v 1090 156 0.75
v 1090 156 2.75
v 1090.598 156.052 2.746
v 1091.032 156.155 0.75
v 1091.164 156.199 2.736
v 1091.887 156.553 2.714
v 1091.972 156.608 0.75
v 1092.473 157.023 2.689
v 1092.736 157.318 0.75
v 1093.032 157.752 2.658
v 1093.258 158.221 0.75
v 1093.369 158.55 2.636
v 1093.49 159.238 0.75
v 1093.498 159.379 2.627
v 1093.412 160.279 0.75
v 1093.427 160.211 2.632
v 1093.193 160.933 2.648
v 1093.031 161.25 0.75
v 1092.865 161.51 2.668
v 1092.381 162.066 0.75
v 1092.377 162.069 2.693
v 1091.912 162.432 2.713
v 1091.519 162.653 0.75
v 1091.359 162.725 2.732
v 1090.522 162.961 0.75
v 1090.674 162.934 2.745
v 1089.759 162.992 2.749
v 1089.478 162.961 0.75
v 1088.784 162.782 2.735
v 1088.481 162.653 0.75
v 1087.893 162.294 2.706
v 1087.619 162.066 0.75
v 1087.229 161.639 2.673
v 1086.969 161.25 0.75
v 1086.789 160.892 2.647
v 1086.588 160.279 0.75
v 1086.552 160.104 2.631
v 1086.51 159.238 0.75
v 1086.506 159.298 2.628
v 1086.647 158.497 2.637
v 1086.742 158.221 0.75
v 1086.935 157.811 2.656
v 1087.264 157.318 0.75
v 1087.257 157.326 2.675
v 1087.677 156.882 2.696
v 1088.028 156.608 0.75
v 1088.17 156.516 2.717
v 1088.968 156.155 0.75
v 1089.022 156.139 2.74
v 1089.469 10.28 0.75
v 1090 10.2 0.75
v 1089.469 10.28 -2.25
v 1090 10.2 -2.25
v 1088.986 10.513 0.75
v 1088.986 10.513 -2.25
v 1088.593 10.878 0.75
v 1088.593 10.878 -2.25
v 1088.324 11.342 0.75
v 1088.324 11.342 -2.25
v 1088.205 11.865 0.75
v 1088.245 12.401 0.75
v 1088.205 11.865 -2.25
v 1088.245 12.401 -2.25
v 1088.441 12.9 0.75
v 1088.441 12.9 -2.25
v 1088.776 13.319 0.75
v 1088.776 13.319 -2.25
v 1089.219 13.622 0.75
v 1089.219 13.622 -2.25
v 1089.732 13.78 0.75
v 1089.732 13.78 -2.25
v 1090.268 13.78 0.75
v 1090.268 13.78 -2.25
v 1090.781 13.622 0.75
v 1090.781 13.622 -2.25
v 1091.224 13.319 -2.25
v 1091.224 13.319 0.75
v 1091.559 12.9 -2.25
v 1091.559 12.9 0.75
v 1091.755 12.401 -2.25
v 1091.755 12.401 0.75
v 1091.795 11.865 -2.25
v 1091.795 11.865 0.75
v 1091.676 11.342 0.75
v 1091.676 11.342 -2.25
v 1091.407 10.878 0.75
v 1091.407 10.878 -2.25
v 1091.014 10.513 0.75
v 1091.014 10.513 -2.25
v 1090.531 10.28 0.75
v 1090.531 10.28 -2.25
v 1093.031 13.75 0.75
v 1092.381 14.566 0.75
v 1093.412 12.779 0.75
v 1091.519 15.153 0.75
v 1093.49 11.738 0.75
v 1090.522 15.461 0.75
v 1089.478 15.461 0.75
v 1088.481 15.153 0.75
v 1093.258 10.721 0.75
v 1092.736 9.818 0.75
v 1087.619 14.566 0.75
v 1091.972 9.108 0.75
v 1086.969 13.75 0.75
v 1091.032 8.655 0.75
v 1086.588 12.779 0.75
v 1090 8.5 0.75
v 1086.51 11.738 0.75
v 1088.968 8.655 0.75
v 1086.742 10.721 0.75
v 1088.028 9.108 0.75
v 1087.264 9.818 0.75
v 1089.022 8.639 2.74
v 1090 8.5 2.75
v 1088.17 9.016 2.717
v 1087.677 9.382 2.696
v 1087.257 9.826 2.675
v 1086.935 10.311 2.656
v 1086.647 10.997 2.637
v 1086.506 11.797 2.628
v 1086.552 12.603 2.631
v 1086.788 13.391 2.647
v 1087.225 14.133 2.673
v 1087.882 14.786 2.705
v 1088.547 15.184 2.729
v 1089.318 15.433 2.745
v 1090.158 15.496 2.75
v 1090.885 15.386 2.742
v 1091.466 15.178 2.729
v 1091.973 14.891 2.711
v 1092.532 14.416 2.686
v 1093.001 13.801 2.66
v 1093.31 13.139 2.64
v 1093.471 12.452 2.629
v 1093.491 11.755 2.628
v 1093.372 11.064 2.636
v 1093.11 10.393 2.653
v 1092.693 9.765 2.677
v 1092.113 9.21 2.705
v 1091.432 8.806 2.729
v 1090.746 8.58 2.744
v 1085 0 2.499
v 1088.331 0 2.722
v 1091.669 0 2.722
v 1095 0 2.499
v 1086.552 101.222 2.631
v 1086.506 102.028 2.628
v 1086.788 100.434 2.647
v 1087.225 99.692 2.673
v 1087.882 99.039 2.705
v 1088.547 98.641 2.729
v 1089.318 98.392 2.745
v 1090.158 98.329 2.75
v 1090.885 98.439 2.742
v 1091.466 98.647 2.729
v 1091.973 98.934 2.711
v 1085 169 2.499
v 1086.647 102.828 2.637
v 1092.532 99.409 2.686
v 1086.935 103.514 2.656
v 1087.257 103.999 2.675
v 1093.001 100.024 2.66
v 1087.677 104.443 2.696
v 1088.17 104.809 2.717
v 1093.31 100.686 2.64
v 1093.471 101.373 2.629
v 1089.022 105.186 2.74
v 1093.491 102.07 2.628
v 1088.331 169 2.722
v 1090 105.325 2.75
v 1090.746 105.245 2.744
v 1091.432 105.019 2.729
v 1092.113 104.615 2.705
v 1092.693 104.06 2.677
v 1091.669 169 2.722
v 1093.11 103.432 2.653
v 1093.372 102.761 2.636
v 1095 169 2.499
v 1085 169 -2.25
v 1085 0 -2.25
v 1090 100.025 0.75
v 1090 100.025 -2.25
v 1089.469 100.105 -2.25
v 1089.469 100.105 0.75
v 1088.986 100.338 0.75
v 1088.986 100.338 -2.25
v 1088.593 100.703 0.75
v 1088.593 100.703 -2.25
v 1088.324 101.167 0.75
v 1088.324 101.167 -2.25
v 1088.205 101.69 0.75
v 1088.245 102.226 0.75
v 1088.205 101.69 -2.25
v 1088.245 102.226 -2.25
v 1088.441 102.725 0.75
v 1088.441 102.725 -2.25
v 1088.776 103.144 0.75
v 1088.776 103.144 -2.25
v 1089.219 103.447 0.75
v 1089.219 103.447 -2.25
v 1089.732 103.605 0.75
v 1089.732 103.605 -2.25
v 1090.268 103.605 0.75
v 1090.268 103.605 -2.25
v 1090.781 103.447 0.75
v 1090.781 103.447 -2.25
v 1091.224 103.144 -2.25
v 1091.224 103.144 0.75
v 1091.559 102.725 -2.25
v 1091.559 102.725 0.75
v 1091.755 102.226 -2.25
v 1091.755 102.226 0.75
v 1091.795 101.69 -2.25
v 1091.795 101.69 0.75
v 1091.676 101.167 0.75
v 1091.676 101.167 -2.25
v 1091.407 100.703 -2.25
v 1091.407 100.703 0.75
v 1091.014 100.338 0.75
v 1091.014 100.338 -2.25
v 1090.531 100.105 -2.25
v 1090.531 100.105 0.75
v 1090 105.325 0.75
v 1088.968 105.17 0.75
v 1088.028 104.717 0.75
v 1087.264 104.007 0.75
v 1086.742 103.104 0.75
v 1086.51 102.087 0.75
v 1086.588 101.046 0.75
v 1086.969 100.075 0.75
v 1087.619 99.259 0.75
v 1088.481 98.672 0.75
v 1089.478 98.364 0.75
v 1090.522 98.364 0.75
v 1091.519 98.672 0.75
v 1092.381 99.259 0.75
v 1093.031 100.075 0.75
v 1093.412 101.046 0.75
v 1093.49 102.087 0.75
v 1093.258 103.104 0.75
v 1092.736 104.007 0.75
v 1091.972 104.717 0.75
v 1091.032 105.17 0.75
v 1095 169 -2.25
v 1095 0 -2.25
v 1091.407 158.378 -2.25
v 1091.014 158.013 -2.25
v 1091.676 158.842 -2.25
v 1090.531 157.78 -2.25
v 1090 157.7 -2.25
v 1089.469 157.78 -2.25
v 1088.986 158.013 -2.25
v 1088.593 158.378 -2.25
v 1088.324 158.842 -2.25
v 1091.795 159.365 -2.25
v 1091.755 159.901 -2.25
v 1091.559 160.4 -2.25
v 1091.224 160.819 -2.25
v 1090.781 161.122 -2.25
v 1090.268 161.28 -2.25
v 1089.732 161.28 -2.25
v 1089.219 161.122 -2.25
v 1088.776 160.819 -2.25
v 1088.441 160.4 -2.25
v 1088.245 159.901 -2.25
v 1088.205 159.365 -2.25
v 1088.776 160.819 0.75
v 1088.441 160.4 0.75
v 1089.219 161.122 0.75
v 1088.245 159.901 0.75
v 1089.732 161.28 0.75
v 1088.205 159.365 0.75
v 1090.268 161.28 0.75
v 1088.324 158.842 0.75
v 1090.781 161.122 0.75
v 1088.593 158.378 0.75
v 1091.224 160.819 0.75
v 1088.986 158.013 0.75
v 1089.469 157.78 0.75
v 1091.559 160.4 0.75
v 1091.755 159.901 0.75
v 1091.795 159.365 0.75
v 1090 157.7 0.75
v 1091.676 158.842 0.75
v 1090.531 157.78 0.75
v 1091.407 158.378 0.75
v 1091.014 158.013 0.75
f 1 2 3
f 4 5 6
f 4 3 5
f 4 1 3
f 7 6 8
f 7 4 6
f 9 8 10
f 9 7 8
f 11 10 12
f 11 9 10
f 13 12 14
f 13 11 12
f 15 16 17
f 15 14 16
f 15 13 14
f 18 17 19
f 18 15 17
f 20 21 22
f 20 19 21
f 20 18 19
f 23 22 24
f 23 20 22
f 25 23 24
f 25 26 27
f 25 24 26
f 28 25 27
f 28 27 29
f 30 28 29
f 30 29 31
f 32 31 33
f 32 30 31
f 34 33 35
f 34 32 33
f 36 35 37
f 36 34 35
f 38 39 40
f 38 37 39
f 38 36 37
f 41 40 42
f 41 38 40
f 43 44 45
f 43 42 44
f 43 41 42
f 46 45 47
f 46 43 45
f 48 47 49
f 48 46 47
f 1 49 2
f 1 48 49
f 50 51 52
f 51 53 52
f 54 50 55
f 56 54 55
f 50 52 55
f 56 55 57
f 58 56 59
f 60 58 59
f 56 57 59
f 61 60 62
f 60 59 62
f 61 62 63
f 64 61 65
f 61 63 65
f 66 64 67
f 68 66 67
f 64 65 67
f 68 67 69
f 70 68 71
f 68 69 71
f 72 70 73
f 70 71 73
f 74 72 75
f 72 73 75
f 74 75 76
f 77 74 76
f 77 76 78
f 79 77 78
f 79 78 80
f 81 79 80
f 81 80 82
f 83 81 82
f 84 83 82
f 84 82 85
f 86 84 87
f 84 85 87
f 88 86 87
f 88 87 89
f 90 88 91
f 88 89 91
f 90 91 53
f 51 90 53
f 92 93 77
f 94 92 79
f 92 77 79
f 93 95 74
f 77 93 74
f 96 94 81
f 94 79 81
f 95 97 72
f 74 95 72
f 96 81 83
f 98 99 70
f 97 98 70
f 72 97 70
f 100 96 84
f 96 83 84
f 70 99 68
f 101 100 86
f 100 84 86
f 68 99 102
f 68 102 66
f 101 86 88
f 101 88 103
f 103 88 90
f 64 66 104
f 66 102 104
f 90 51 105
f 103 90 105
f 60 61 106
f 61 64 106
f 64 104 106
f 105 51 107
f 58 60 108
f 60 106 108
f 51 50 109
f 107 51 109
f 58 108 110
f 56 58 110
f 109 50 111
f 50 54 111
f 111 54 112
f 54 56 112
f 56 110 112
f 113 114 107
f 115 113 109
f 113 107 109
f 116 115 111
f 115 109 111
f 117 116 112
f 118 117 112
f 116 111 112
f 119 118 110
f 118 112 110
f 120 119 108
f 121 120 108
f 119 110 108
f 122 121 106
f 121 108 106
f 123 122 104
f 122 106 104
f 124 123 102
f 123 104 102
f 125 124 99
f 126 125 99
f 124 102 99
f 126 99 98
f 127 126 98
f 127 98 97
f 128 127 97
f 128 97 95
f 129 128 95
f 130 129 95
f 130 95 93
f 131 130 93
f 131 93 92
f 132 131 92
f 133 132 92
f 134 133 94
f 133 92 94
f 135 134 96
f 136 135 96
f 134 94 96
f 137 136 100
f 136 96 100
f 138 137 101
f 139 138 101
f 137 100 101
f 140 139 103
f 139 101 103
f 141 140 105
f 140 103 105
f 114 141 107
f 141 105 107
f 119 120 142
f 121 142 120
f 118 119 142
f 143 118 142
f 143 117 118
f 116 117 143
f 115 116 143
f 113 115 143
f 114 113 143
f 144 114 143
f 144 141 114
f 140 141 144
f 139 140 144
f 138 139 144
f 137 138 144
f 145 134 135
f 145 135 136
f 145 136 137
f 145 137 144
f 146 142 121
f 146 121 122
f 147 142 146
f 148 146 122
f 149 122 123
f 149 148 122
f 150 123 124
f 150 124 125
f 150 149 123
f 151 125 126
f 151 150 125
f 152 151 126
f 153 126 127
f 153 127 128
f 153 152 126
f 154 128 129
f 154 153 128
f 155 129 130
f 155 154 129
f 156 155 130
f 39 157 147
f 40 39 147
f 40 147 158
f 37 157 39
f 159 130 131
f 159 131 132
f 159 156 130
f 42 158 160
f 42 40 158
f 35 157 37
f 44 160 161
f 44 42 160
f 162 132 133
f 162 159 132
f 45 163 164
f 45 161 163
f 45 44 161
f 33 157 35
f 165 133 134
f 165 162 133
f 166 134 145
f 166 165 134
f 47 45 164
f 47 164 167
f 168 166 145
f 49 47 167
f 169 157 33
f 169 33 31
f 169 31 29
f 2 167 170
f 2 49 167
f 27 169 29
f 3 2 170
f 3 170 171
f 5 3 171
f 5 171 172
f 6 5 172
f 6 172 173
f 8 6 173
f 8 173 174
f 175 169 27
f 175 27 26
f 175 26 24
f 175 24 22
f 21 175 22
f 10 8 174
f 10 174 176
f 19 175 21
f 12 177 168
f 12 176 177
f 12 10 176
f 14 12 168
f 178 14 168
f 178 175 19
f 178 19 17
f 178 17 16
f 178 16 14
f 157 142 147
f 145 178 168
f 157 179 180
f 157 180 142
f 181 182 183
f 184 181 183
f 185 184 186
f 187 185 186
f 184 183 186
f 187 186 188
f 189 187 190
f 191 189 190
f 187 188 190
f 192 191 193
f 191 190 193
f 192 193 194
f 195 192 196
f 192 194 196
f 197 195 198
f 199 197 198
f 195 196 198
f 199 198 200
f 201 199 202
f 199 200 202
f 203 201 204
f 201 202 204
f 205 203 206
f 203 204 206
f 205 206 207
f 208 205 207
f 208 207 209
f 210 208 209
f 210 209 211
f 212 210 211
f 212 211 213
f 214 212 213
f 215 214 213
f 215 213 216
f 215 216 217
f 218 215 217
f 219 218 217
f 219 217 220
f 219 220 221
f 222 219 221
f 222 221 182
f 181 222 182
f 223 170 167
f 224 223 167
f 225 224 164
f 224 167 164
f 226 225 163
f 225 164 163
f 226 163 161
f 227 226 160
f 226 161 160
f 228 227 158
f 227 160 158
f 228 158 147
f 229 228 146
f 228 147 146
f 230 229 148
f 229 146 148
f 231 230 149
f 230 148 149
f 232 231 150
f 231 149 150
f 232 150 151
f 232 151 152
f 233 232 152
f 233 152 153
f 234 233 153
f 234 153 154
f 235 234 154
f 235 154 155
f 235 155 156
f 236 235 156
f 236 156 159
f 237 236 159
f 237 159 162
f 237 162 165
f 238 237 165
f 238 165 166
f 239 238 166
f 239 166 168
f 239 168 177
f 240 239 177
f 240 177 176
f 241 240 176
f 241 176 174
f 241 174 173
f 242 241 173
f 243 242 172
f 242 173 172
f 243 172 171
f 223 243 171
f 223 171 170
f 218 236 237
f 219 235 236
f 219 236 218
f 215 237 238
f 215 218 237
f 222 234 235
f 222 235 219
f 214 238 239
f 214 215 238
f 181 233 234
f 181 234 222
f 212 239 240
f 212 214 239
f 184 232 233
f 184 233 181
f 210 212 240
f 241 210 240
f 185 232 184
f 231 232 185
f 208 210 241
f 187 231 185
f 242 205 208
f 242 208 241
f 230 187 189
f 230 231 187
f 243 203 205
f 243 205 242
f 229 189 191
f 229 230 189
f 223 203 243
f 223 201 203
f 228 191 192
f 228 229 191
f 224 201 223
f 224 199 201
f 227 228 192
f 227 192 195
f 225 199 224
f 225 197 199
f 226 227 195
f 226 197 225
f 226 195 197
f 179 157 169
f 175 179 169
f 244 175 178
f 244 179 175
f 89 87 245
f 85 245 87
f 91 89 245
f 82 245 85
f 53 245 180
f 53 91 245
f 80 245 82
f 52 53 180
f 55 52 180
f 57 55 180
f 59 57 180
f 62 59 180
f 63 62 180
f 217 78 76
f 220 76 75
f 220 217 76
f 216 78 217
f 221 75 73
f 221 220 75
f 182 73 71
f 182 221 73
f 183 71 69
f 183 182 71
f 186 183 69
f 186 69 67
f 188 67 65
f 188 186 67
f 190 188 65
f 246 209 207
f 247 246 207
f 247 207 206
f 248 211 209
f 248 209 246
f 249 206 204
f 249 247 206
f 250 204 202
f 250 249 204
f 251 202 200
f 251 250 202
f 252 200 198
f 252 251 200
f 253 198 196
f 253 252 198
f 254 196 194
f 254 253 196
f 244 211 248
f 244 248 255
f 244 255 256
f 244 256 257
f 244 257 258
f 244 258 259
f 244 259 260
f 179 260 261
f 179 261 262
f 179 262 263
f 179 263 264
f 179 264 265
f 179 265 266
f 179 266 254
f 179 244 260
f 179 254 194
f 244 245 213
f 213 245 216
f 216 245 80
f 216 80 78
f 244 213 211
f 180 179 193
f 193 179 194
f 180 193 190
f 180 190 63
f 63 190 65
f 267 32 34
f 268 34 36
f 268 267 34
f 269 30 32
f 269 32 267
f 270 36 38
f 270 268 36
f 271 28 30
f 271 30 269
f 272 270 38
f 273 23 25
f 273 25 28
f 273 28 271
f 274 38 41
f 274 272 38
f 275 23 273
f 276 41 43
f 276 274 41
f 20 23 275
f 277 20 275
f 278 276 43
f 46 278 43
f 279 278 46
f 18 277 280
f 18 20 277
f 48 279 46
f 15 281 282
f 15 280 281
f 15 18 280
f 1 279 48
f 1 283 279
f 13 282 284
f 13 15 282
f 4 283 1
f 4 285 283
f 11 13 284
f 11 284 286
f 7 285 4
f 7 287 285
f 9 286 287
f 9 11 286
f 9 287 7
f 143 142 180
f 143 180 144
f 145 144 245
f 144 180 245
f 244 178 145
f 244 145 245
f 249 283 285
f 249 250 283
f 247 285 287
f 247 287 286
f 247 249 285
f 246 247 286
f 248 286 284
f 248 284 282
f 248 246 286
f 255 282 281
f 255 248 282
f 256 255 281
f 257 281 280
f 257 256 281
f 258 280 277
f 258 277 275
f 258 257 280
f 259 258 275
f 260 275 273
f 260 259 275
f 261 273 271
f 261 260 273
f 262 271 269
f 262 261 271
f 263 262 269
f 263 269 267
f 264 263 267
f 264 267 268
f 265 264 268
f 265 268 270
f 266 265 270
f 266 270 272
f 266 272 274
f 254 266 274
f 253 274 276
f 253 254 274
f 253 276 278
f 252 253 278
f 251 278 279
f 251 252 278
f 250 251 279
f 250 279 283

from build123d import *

# Parameters (mm, degrees)
EXTRUDE_1_DEPTH              = 169
HOLE_WIZARD_M3_1_D           = 3.6
HOLE_WIZARD_M3_1_DEPTH       = 5
HOLE_WIZARD_M3_1_CBORE_D     = 7
HOLE_WIZARD_M3_1_CBORE_DEPTH = 2


with BuildPart() as part:
    # 草图1 → 凸台-拉伸1 (new body)
    with BuildSketch(Plane(origin=(0, 169, 0), x_dir=(1, 0, 0), z_dir=(0, 1, 0))):
        with BuildLine():
            Line((1095, -2.499371855), (1095, 2.25))
            Line((1095, 2.25), (1085, 2.25))
            Line((1085, 2.25), (1085, -2.499371855))
            ThreePointArc((1085, -2.499371855), (1090, -2.75), (1095, -2.499371855))
        make_face()
    extrude(amount=-EXTRUDE_1_DEPTH)

    # M3 六角头机械螺钉的柱形沉头孔1
    with Locations(Plane(origin=(1090, 101.825, 2.75), x_dir=(0, 1, 0), z_dir=(0, 0, 1))):
        with Locations((0, 0)):
            CounterBoreHole(HOLE_WIZARD_M3_1_D / 2, HOLE_WIZARD_M3_1_CBORE_D / 2, HOLE_WIZARD_M3_1_CBORE_DEPTH, depth=HOLE_WIZARD_M3_1_DEPTH)

    # 草图4 → 切除-旋转1 (revolve, cut)
    with BuildSketch(Plane(origin=(1090, 0, 0), x_dir=(0, 0, -1), z_dir=(1, 0, 0))):
        Polygon((-2.75, 159.5), (-2.75, 156), (-0.75, 156), (-0.75, 157.7), (2.25, 157.7), (2.25, 159.5), align=None)
    revolve(axis=Axis((1090, 159.5, -2.25), (0, 0, 1)), mode=Mode.SUBTRACT)

    # 草图5 → 切除-旋转2 (revolve, cut)
    with BuildSketch(Plane(origin=(1090, 0, 0), x_dir=(0, 0, -1), z_dir=(1, 0, 0))):
        Polygon((-2.75, 12), (-2.75, 8.5), (-0.75, 8.5), (-0.75, 10.2), (2.25, 10.2), (2.25, 12), align=None)
    revolve(axis=Axis((1090, 12, 2.75), (0, 0, -1)), mode=Mode.SUBTRACT)


solid = part.part
